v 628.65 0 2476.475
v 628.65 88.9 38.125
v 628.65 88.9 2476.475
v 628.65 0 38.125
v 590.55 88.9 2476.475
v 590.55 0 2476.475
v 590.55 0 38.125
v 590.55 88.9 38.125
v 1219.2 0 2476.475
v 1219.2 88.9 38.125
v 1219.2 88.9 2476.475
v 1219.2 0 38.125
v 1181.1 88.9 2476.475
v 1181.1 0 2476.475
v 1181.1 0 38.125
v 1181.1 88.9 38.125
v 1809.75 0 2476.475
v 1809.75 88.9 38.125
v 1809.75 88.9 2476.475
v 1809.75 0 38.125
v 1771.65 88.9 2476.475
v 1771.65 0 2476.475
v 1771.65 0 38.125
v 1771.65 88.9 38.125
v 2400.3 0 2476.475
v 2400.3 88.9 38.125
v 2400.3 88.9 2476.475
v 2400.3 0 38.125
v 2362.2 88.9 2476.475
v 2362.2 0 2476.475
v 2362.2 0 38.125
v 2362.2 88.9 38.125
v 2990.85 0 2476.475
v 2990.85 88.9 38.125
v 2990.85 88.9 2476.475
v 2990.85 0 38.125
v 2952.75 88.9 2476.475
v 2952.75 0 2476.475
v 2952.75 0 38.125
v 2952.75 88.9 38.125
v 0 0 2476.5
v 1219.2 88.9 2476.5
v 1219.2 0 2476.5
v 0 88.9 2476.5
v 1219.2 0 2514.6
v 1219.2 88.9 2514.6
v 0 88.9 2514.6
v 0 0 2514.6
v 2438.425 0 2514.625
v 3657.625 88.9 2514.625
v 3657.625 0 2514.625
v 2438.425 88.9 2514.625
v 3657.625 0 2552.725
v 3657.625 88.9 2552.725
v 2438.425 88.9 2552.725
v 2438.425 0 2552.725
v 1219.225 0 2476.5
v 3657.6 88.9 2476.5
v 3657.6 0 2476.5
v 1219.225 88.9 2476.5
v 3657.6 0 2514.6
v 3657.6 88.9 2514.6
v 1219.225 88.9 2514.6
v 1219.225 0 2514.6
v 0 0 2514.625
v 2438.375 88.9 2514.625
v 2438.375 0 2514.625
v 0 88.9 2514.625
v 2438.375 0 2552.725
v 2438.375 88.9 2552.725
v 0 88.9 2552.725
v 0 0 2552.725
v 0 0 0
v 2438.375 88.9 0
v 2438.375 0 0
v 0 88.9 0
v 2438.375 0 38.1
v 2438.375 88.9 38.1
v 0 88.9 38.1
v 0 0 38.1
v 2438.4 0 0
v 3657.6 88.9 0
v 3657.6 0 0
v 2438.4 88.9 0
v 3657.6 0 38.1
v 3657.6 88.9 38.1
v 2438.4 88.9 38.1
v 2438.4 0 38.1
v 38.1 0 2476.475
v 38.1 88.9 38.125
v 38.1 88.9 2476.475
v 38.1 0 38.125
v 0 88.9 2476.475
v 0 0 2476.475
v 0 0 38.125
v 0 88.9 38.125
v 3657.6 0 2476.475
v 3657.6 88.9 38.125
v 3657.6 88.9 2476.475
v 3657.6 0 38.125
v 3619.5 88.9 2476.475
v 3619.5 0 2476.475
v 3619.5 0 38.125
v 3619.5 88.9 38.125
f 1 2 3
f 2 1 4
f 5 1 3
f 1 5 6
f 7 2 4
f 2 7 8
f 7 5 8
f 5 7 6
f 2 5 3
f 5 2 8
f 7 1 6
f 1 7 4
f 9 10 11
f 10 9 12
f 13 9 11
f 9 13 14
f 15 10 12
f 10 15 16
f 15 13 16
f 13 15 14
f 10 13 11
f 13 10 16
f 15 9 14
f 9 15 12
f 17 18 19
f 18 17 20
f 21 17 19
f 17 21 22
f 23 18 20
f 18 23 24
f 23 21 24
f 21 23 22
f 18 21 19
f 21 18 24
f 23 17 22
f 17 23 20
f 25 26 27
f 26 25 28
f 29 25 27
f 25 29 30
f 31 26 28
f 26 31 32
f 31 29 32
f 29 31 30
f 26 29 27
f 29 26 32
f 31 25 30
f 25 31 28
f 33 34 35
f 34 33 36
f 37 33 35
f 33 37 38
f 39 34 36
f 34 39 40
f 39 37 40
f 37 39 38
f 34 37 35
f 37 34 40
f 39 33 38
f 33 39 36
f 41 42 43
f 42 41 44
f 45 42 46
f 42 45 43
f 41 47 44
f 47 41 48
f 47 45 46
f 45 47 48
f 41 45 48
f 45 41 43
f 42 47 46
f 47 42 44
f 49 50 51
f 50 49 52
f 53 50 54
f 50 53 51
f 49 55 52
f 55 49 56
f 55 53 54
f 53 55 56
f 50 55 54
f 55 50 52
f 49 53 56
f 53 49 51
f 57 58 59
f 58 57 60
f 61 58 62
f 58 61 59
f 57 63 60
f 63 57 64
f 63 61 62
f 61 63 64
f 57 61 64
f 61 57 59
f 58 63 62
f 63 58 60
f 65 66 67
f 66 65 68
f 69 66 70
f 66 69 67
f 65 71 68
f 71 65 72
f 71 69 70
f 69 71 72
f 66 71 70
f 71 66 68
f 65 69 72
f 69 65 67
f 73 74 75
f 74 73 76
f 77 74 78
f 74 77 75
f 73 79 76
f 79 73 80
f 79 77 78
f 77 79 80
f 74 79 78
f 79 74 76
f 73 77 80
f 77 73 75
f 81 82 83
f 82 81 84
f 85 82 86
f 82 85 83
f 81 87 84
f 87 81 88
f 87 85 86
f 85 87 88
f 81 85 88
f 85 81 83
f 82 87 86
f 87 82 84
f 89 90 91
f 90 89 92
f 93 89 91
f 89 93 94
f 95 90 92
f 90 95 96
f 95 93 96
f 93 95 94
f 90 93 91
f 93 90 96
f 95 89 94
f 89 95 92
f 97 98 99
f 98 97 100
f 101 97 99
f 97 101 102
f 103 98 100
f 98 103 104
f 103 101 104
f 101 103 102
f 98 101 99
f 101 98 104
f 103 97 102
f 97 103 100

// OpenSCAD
// Dimensions of the requested wall
Wall_Dimensions = [144, 100.5];

// Dimensions of the studs to use
Stud_Dimensions = [1.5, 3.5, 96];

// On center stud spacing
Stud_Spacing = 24;

// Object spacing to avoid merging on export
Object_Spacing = 0.001;

// Determines if middle studs are included
Include_Studs = true;

// Scale factor useful when importing to other software (ex. 25.4 for inches);
Scale_Factor = 25.4;

module wall() {
	length = Wall_Dimensions[0];
	height = Wall_Dimensions[1];
	
	stud_length = Stud_Dimensions[2];
	
	// sill plate
	plate_parts = floor(length / stud_length);
	plate_overflow = length % stud_length;
	
	for (i = [1:1:plate_parts]) {
		rotate([0, 90, 0])
		translate([-Stud_Dimensions[0], 0, (i - 1) * stud_length])
		cube([Stud_Dimensions[0], Stud_Dimensions[1], Stud_Dimensions[2] - Object_Spacing]);
	}
	
	if (plate_overflow > 0) {
		rotate([0, 90, 0])
		translate([-Stud_Dimensions[0], 0, plate_parts * stud_length])
		cube([Stud_Dimensions[0], Stud_Dimensions[1], plate_overflow]);
	}
	
	// studs
	// first
	translate([0, 0, Stud_Dimensions[0] + Object_Spacing])
	cube([Stud_Dimensions[0], Stud_Dimensions[1], Stud_Dimensions[2] - (Object_Spacing * 2)]);
	
	if (Include_Studs) {
		// studs
		stud_count = length % Stud_Spacing == 0 ? (length / Stud_Spacing) - 1 : (length / Stud_Spacing);
		for (i = [1:1:stud_count]) {
			translate([i * (Stud_Spacing - Stud_Dimensions[0]/2), 0, Stud_Dimensions[0] + Object_Spacing])
			cube([Stud_Dimensions[0], Stud_Dimensions[1], Stud_Dimensions[2] - (Object_Spacing * 2)]);
		}
	}
	
	// last
	translate([length - Stud_Dimensions[0], 0, Stud_Dimensions[0] + Object_Spacing])
	cube([Stud_Dimensions[0], Stud_Dimensions[1], Stud_Dimensions[2] - (Object_Spacing * 2)]);
	
	// top plates
	if (plate_overflow > 0) {
		rotate([0, 90, 0])
		translate([-height + Stud_Dimensions[0], 0, 0])
		cube([Stud_Dimensions[0], Stud_Dimensions[1], plate_overflow]);
		
		rotate([0, 90, 0])
		translate([-height - Stud_Dimensions[0] - Object_Spacing + Stud_Dimensions[0], 0, plate_parts * stud_length + Object_Spacing])
		cube([Stud_Dimensions[0], Stud_Dimensions[1], plate_overflow]);
	}
	
	for (i = [1:1:plate_parts]) {
		rotate([0, 90, 0])
		translate([-height + Stud_Dimensions[0], 0, plate_overflow + Object_Spacing + (i - 1) * stud_length])
		cube([Stud_Dimensions[0], Stud_Dimensions[1], Stud_Dimensions[2] - Object_Spacing]);
		
		rotate([0, 90, 0])
		translate([-height - Stud_Dimensions[0] - Object_Spacing + Stud_Dimensions[0], 0, (i - 1) * stud_length])
		cube([Stud_Dimensions[0], Stud_Dimensions[1], Stud_Dimensions[2] - Object_Spacing]);
	}
}

scale([Scale_Factor, Scale_Factor, Scale_Factor])
wall();
